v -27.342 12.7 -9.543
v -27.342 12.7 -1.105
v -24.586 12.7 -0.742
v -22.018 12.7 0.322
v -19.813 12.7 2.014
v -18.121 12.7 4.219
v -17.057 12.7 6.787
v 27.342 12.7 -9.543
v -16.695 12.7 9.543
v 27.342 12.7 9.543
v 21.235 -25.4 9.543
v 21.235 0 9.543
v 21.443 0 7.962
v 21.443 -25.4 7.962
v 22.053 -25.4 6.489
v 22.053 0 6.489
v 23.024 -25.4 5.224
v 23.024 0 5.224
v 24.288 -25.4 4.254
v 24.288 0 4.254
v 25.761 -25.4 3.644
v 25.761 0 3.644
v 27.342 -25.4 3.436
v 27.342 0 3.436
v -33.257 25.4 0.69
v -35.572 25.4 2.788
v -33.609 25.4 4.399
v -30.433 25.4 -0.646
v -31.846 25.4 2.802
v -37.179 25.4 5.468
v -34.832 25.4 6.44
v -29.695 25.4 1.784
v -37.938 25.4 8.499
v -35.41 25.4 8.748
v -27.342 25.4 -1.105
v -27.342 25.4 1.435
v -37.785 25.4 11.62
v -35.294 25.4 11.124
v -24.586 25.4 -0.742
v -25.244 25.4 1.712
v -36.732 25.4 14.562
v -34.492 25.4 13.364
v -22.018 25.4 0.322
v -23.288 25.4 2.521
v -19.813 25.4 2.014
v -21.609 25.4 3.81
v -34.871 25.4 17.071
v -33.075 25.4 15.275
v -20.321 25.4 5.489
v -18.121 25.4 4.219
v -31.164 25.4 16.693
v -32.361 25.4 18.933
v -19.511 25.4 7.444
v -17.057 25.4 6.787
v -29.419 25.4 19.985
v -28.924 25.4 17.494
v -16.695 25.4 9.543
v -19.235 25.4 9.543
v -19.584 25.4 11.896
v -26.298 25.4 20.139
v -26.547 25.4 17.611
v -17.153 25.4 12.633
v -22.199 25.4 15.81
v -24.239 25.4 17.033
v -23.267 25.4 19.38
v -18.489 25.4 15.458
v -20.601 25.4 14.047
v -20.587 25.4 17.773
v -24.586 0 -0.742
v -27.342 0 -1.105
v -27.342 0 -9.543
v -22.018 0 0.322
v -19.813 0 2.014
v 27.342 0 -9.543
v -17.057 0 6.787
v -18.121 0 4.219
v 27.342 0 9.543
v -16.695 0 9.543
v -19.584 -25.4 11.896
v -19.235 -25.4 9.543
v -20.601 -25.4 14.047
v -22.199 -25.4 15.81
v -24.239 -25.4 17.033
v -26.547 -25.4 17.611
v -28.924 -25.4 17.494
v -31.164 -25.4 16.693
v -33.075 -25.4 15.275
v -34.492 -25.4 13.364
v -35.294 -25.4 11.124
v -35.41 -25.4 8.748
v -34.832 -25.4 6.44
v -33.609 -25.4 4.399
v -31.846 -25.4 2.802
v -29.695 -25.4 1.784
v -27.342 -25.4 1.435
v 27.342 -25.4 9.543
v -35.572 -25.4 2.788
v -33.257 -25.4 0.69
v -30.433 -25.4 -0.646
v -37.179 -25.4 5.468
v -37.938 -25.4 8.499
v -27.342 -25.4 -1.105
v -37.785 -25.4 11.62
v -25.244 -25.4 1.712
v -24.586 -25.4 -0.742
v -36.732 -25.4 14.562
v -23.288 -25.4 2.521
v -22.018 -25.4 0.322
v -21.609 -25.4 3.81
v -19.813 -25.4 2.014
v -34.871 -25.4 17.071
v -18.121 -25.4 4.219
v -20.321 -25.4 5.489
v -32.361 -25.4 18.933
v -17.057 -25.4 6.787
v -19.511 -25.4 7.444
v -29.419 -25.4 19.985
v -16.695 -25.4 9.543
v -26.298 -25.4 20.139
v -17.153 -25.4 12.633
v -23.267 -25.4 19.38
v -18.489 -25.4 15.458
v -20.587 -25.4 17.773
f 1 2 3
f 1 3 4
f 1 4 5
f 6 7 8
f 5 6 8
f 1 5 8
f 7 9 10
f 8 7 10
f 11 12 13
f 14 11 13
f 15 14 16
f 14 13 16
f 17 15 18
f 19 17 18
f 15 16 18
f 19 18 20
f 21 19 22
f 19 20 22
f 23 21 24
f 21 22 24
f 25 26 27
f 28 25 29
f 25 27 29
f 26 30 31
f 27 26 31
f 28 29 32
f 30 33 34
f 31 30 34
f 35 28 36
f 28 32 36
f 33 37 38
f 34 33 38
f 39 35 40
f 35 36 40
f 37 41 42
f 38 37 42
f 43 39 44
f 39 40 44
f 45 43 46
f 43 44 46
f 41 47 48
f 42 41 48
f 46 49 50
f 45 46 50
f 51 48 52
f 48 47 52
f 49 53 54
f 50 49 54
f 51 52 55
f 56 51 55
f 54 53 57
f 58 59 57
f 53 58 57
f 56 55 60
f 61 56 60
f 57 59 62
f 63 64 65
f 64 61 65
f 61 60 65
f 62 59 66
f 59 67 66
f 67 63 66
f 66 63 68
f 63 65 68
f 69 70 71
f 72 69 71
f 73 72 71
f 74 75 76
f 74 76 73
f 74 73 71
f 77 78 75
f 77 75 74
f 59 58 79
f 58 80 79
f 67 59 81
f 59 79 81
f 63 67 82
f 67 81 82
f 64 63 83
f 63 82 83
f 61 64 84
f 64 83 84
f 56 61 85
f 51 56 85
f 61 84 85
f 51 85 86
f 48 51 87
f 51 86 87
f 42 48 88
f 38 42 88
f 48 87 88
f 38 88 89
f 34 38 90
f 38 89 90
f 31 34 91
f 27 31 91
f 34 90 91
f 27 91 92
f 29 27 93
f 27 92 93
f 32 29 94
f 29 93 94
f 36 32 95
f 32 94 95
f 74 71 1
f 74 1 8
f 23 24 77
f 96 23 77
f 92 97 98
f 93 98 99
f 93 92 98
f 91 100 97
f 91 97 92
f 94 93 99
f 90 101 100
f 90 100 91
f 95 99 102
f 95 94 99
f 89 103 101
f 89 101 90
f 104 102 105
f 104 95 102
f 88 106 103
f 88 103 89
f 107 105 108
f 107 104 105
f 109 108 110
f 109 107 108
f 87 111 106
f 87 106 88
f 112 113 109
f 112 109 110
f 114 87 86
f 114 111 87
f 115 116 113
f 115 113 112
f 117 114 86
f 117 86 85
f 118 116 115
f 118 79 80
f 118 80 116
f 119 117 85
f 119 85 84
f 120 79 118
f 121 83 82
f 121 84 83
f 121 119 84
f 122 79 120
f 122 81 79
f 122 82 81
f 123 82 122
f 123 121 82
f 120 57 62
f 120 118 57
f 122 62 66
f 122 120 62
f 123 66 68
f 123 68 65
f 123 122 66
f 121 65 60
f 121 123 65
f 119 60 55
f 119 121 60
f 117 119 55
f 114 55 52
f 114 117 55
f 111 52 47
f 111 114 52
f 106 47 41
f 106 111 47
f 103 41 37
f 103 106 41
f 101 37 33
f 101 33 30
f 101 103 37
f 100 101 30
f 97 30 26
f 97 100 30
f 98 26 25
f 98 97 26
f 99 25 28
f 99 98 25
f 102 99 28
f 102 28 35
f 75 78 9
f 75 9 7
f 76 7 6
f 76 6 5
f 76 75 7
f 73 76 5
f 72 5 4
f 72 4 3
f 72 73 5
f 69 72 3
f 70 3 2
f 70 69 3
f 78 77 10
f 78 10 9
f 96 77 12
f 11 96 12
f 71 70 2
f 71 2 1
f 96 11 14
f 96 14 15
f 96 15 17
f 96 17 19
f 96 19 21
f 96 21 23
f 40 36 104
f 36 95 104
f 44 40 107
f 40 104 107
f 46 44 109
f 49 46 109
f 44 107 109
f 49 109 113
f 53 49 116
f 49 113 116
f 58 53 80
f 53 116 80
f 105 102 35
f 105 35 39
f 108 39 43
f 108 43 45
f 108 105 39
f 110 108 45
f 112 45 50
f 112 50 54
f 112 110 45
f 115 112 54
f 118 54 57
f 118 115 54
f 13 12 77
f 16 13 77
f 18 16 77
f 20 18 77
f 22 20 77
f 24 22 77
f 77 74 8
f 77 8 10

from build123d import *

# Parameters (mm, degrees)
F3_DEPTH = 25.4
F4_DEPTH = 25.4
F5_DEPTH = 12.7
F6_T     = -2.54


with BuildPart() as f3:
    # F0 (on Front) → F3 (new body, symmetric)
    with BuildSketch(Plane.XZ):
        with BuildLine():
            Line((-27.341943, 9.542671), (-16.694574, 9.542671))
            ThreePointArc((-16.694574, 9.542671), (-34.870769, 17.071497), (-27.341943, -1.104698))
            Line((-27.341943, -1.104698), (-27.341943, 9.542671))
        make_face()
        with BuildLine():
            ThreePointArc((-27.341943, -1.104698), (-19.813116, 2.013844), (-16.694574, 9.542671))
            Line((-16.694574, 9.542671), (-27.341943, 9.542671))
            Line((-27.341943, 9.542671), (-27.341943, -1.104698))
        make_face()
    extrude(amount=F3_DEPTH, both=True)

    # F6
    f6_openings = [f3.faces().sort_by_distance(p)[0] for p in [
        (-27.341943, -25.4, 9.542671),
        (-27.341943, 25.4, 9.542671),
    ]]
    offset(amount=F6_T, openings=f6_openings)


with BuildPart() as f4:
    # F0 (on Front) → F4 (new body)
    with BuildSketch(Plane.XZ):
        with BuildLine():
            Line((27.341943, 9.542671), (21.234945, 9.542671))
            ThreePointArc((21.234945, 9.542671), (23.023643, 5.224371), (27.341943, 3.435673))
            Line((27.341943, 3.435673), (27.341943, 9.542671))
        make_face()
    extrude(amount=F4_DEPTH)


with BuildPart() as f5:
    # F0 (on Front) → F5 (new body)
    with BuildSketch(Plane.XZ):
        with BuildLine():
            Line((21.234945, 9.542671), (-16.694574, 9.542671))
            ThreePointArc((-16.694574, 9.542671), (-19.813116, 2.013844), (-27.341943, -1.104698))
            Line((-27.341943, -1.104698), (-27.341943, -9.542671))
            Line((-27.341943, -9.542671), (27.341943, -9.542671))
            Line((27.341943, -9.542671), (27.341943, 3.435673))
            ThreePointArc((27.341943, 3.435673), (23.023643, 5.224371), (21.234945, 9.542671))
        make_face()
        with BuildLine():
            Line((27.341943, 9.542671), (21.234945, 9.542671))
            ThreePointArc((21.234945, 9.542671), (23.023643, 5.224371), (27.341943, 3.435673))
            Line((27.341943, 3.435673), (27.341943, 9.542671))
        make_face()
    extrude(amount=-F5_DEPTH)


solid = Compound([f3.part, f4.part, f5.part])
